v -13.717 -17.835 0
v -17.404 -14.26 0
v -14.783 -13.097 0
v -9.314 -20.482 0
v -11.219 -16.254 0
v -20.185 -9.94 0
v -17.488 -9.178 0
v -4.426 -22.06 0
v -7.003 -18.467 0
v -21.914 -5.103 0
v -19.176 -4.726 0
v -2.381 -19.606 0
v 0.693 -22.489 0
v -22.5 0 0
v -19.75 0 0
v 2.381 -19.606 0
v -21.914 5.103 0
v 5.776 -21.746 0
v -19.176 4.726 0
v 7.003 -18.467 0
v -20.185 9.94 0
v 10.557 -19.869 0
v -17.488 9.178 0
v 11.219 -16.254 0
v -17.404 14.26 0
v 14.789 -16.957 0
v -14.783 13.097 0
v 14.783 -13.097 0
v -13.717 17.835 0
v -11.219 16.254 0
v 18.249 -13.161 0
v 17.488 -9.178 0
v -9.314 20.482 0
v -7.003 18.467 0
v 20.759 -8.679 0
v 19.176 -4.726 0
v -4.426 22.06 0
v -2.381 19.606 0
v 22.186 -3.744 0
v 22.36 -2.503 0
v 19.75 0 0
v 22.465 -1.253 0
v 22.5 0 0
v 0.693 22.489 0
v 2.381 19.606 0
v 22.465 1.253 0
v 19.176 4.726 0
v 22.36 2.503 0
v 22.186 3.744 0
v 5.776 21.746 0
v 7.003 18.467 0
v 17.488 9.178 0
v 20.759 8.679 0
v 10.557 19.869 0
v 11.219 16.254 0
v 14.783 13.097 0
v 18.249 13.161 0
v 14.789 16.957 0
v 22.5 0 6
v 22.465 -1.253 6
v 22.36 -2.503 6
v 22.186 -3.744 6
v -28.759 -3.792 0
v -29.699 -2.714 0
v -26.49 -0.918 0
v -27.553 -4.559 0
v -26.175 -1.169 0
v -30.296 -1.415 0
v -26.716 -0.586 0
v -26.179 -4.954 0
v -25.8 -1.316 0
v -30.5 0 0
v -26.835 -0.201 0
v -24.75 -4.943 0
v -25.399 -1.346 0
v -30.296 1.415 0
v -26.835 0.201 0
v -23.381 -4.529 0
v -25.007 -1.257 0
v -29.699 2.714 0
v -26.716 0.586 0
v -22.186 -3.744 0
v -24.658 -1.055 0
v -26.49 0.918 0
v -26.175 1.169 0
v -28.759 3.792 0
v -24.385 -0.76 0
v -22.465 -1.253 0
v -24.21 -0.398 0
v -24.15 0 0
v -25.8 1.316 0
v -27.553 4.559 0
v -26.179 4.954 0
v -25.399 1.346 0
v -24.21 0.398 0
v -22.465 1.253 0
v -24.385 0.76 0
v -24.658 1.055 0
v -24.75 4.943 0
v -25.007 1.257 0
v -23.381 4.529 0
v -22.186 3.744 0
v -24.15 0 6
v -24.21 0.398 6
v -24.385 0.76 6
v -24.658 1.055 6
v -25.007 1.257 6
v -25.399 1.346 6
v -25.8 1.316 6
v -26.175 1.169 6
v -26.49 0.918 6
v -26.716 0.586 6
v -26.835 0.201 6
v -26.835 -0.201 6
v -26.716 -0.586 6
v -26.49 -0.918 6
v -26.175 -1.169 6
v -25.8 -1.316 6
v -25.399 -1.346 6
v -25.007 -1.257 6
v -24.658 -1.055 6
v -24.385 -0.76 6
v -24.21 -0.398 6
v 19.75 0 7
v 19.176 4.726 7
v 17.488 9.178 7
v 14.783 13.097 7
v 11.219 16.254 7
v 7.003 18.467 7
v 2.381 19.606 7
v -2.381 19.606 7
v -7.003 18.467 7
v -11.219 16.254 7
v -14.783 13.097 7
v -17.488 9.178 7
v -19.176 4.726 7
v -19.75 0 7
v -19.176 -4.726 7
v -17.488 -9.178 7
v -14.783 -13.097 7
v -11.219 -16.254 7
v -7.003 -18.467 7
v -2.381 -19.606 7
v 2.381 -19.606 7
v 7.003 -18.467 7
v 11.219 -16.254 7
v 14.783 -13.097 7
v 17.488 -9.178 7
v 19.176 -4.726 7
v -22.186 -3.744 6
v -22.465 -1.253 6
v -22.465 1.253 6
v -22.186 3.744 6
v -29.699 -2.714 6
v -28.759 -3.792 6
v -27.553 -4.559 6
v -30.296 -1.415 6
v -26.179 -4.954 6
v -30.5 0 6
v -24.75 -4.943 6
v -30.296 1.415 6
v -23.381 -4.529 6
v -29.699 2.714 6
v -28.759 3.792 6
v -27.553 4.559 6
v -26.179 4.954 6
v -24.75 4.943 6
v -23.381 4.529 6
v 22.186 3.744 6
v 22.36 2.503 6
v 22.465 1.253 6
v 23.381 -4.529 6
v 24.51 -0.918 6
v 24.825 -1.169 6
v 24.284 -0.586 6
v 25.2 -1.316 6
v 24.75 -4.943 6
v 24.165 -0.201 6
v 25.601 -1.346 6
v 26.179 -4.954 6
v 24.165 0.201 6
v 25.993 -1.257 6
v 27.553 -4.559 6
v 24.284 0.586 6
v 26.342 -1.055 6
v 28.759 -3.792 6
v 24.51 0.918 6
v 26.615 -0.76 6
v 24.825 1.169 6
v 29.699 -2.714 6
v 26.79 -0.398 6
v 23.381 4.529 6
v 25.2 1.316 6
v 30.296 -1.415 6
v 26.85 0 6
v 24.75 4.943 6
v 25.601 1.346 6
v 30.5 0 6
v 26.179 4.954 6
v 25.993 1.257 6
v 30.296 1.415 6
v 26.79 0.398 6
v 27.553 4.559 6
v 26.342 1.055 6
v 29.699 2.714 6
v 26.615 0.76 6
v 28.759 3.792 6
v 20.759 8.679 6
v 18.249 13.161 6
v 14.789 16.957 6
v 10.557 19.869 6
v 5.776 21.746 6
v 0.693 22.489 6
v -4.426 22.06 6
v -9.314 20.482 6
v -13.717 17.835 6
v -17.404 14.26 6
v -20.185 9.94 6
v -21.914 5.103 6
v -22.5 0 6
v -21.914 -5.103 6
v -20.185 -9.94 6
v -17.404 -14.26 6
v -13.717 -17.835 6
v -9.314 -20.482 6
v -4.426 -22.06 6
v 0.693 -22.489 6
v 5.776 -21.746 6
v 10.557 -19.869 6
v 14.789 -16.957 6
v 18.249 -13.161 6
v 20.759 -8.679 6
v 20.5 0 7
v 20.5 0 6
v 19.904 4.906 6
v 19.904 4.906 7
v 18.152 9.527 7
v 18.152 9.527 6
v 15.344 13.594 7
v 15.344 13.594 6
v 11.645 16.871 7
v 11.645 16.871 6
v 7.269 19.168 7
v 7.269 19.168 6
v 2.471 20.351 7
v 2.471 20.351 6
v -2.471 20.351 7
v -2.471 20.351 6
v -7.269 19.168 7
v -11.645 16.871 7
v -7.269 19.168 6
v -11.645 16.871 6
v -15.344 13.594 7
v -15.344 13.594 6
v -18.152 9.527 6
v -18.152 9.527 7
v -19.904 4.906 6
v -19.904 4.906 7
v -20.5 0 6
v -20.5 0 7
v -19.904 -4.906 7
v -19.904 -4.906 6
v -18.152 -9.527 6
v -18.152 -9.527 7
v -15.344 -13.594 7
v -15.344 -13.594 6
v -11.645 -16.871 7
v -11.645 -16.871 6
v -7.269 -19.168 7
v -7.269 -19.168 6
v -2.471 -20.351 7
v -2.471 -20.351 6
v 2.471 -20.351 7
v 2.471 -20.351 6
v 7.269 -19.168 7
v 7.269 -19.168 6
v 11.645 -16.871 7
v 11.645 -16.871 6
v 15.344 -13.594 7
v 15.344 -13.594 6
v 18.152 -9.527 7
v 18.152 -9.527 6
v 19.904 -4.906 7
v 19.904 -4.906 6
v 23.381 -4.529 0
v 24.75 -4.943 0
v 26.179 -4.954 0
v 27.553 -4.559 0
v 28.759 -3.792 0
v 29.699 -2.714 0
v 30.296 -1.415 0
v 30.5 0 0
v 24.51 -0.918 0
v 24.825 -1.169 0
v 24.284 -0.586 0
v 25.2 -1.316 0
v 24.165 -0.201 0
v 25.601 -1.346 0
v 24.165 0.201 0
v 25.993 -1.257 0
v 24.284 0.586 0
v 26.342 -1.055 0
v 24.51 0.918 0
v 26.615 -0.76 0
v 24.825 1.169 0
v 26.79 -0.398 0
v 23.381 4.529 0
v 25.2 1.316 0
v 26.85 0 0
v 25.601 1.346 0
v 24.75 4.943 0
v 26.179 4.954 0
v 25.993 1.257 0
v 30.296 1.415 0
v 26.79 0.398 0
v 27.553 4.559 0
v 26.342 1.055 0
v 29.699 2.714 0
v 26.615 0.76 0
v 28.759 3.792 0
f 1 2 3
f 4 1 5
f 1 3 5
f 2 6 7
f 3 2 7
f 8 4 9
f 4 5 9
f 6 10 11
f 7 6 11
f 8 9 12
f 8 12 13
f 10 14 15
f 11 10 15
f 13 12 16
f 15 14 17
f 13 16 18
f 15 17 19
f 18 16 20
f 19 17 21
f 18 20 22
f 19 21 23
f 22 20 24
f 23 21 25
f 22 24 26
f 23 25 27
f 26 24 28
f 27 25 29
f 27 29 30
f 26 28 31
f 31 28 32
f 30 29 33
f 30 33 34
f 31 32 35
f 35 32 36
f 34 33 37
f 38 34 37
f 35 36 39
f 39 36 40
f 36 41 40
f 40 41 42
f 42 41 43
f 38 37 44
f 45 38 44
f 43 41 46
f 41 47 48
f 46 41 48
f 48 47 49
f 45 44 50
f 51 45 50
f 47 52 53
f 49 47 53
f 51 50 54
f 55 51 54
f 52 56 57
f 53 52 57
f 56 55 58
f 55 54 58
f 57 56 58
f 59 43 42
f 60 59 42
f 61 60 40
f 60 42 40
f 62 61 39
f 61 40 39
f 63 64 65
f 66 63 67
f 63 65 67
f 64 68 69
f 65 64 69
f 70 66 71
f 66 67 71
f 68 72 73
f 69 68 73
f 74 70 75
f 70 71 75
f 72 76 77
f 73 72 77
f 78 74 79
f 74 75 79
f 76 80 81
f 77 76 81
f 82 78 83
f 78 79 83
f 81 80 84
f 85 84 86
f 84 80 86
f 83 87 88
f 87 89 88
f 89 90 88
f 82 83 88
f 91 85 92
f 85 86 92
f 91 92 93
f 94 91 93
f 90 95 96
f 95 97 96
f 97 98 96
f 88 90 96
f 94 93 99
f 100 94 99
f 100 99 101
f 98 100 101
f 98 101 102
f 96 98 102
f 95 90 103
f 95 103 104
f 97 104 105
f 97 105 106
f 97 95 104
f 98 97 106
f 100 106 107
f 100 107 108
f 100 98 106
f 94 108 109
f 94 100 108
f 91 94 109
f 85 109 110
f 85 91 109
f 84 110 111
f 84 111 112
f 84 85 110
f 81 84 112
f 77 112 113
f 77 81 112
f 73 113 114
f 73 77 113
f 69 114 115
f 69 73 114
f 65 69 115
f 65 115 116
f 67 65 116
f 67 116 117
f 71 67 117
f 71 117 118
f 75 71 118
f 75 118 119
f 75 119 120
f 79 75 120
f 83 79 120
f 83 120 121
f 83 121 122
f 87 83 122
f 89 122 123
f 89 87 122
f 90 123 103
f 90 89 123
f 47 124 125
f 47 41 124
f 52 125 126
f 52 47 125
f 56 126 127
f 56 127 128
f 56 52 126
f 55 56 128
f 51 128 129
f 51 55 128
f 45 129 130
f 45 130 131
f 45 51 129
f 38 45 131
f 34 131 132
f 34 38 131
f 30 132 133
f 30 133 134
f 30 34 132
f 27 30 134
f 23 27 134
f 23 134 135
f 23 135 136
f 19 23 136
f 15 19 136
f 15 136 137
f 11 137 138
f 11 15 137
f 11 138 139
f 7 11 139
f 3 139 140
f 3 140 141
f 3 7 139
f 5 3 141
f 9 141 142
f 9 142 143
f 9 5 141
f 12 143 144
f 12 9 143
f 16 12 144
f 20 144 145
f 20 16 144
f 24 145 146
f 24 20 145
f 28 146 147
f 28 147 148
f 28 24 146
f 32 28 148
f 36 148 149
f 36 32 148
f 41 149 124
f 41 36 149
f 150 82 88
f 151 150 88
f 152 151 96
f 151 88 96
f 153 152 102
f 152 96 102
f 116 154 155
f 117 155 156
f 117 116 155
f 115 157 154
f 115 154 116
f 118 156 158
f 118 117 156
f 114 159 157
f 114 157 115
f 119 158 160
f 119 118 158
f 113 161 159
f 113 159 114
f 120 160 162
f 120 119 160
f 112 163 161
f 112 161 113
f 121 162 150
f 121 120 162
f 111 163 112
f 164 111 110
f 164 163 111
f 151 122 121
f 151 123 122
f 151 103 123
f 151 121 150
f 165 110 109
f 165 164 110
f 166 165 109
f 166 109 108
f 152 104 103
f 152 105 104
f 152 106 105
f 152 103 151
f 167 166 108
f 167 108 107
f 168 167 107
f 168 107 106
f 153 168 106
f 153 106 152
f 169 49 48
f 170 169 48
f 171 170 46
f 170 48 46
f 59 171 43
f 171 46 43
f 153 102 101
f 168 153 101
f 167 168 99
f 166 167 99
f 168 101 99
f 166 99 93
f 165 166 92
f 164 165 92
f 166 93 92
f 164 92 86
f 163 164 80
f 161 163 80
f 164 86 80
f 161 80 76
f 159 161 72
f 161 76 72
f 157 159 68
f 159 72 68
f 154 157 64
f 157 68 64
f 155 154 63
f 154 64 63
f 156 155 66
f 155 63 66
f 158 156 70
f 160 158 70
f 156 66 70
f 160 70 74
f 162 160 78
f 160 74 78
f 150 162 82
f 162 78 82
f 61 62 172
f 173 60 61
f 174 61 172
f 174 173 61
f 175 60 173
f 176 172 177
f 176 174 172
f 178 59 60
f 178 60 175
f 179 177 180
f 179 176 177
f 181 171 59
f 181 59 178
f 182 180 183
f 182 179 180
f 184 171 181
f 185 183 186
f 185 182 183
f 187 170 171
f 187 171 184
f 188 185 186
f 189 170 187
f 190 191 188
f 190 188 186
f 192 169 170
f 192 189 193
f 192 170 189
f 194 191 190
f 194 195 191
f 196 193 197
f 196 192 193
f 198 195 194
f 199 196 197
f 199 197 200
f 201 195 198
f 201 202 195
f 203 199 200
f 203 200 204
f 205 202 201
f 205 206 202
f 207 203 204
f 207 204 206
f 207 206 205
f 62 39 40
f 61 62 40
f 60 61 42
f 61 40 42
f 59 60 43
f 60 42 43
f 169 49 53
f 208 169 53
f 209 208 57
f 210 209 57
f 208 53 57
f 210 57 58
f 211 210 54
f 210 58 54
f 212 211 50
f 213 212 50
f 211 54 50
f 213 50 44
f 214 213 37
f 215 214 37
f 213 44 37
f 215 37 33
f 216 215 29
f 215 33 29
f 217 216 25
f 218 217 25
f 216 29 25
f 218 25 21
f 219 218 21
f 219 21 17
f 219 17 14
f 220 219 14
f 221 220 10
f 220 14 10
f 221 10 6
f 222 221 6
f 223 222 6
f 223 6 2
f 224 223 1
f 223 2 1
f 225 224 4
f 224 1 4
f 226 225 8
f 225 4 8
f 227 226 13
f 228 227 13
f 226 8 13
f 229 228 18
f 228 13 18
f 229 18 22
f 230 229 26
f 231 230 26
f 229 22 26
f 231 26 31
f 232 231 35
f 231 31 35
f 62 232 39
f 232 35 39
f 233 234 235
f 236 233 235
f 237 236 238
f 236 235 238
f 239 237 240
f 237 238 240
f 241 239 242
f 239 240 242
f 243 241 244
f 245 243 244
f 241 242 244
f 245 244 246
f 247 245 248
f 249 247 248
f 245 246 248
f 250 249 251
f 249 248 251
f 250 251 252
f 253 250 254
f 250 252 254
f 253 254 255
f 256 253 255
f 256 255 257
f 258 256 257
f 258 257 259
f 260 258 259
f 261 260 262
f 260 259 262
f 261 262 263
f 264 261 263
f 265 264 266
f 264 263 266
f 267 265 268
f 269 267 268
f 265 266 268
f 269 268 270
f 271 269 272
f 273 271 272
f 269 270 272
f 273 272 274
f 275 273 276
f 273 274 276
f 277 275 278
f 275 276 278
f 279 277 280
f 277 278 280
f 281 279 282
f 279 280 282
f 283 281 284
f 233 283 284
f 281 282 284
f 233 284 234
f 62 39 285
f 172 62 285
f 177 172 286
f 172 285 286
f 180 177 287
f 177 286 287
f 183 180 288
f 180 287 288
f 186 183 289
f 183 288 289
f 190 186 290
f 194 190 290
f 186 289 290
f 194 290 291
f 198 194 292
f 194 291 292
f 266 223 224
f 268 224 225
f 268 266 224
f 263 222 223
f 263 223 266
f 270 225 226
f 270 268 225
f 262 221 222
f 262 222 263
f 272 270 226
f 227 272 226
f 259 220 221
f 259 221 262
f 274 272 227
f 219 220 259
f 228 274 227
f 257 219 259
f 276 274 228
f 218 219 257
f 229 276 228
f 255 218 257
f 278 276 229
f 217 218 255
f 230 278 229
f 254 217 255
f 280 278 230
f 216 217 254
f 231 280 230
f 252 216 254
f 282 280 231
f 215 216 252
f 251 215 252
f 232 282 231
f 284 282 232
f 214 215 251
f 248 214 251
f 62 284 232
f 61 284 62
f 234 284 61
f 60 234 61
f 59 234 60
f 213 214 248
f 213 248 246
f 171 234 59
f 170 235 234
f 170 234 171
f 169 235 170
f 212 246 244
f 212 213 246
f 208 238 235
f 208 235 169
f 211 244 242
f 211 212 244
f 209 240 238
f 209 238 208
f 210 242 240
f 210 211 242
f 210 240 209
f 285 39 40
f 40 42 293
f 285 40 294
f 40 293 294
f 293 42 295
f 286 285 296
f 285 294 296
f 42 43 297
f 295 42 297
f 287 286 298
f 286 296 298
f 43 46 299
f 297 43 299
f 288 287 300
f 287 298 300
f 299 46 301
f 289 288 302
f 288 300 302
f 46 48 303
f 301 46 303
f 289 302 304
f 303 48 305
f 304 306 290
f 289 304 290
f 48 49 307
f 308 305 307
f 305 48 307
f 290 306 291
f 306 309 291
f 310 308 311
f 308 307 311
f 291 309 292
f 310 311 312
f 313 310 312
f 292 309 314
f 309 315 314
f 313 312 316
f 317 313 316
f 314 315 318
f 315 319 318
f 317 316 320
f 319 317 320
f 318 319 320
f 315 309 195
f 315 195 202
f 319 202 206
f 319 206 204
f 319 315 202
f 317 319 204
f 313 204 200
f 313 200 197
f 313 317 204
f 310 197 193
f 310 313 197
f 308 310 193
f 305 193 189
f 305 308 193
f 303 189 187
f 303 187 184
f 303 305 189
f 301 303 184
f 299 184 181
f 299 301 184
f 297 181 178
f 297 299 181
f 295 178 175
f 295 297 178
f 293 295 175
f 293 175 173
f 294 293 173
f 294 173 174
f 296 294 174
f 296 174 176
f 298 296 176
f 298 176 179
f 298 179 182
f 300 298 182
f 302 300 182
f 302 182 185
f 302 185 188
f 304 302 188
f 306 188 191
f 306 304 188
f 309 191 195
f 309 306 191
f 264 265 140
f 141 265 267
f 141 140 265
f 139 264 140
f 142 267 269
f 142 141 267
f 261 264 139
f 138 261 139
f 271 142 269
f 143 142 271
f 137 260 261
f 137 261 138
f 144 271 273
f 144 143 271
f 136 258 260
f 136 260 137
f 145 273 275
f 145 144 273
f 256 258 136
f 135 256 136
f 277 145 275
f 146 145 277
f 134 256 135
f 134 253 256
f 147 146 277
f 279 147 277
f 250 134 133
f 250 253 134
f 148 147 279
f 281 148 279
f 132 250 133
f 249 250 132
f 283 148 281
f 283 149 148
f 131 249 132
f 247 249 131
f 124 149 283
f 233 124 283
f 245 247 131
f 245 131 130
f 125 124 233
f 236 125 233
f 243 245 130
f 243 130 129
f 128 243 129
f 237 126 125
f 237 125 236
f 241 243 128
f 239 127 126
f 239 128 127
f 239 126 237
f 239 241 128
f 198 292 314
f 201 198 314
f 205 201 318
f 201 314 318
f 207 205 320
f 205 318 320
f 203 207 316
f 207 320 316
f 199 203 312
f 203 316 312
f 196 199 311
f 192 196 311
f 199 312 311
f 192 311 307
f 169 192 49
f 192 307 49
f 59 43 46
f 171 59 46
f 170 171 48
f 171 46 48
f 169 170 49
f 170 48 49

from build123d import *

# Parameters (mm, degrees)
F0_R     = 1.35
F1_DEPTH = 6
F0_R_2   = 19.75
F2_DEPTH = 6
F3_DEPTH = 2
F5_R     = 20.5
F5_R_2   = 19.75
F6_DEPTH = 1


with BuildPart() as f1:
    # F0 (on Top) → F1 (new body)
    with BuildSketch(Plane.XY):
        with BuildLine():
            ThreePointArc((-22.1862745098, -3.7442253372), (-22.5, 0), (-22.1862745098, 3.7442253372))
            ThreePointArc((-22.1862745098, 3.7442253372), (-30.5, 0), (-22.1862745098, -3.7442253372))
        make_face()
        with Locations((-25.5, 0)):
            Circle(F0_R, mode=Mode.SUBTRACT)
    extrude(amount=F1_DEPTH)


with BuildPart() as f1b:
    # F0 (on Top) → F1, piece 2 (new body)
    with BuildSketch(Plane.XY):
        with BuildLine():
            ThreePointArc((22.1862745098, 3.7442253372), (22.4214314493, 1.8786728733), (22.5, 0))
            ThreePointArc((22.5, 0), (22.4214314493, -1.8786728733), (22.1862745098, -3.7442253372))
            ThreePointArc((22.1862745098, -3.7442253372), (27.5532136456, -4.5589816544), (30.5, 0))
            ThreePointArc((30.5, 0), (27.5532136456, 4.5589816544), (22.1862745098, 3.7442253372))
        make_face()
        with Locations((25.5, 0)):
            Circle(F0_R, mode=Mode.SUBTRACT)
    extrude(amount=F1_DEPTH)


with BuildPart() as f2:
    # F0 (on Top) → F2 (new body)
    with BuildSketch(Plane.XY):
        with BuildLine():
            ThreePointArc((22.1862745098, -3.7442253372), (20.5, 0), (22.1862745098, 3.7442253372))
            ThreePointArc((22.1862745098, 3.7442253372), (0, 22.5), (-22.1862745098, 3.7442253372))
            ThreePointArc((-22.1862745098, 3.7442253372), (-20.9410183456, 2.0532136456), (-20.5, 0))
            ThreePointArc((-20.5, 0), (-20.9410183456, -2.0532136456), (-22.1862745098, -3.7442253372))
            ThreePointArc((-22.1862745098, -3.7442253372), (0, -22.5), (22.1862745098, -3.7442253372))
        make_face()
        Circle(F0_R_2, mode=Mode.SUBTRACT)
        with BuildLine():
            ThreePointArc((-20.5, 0), (-20.9410183456, 2.0532136456), (-22.1862745098, 3.7442253372))
            ThreePointArc((-22.1862745098, 3.7442253372), (-22.5, 0), (-22.1862745098, -3.7442253372))
            ThreePointArc((-22.1862745098, -3.7442253372), (-20.9410183456, -2.0532136456), (-20.5, 0))
        make_face()
        with BuildLine():
            ThreePointArc((22.1862745098, -3.7442253372), (22.4214314493, -1.8786728733), (22.5, 0))
            ThreePointArc((22.5, 0), (22.4214314493, 1.8786728733), (22.1862745098, 3.7442253372))
            ThreePointArc((22.1862745098, 3.7442253372), (20.5, 0), (22.1862745098, -3.7442253372))
        make_face()
    extrude(amount=F2_DEPTH)

    # F5 (on face) → F6 (join)
    with BuildSketch(Plane.XY.offset(6)):
        Circle(F5_R)
        Circle(F5_R_2, mode=Mode.SUBTRACT)
    extrude(amount=F6_DEPTH)


with BuildPart() as f3:
    # F0 (on Top) → F3 (new body)
    with BuildSketch(Plane.XY):
        Circle(F0_R_2)
    extrude(amount=F3_DEPTH)


solid = Compound([f1.part, f1b.part, f2.part])
